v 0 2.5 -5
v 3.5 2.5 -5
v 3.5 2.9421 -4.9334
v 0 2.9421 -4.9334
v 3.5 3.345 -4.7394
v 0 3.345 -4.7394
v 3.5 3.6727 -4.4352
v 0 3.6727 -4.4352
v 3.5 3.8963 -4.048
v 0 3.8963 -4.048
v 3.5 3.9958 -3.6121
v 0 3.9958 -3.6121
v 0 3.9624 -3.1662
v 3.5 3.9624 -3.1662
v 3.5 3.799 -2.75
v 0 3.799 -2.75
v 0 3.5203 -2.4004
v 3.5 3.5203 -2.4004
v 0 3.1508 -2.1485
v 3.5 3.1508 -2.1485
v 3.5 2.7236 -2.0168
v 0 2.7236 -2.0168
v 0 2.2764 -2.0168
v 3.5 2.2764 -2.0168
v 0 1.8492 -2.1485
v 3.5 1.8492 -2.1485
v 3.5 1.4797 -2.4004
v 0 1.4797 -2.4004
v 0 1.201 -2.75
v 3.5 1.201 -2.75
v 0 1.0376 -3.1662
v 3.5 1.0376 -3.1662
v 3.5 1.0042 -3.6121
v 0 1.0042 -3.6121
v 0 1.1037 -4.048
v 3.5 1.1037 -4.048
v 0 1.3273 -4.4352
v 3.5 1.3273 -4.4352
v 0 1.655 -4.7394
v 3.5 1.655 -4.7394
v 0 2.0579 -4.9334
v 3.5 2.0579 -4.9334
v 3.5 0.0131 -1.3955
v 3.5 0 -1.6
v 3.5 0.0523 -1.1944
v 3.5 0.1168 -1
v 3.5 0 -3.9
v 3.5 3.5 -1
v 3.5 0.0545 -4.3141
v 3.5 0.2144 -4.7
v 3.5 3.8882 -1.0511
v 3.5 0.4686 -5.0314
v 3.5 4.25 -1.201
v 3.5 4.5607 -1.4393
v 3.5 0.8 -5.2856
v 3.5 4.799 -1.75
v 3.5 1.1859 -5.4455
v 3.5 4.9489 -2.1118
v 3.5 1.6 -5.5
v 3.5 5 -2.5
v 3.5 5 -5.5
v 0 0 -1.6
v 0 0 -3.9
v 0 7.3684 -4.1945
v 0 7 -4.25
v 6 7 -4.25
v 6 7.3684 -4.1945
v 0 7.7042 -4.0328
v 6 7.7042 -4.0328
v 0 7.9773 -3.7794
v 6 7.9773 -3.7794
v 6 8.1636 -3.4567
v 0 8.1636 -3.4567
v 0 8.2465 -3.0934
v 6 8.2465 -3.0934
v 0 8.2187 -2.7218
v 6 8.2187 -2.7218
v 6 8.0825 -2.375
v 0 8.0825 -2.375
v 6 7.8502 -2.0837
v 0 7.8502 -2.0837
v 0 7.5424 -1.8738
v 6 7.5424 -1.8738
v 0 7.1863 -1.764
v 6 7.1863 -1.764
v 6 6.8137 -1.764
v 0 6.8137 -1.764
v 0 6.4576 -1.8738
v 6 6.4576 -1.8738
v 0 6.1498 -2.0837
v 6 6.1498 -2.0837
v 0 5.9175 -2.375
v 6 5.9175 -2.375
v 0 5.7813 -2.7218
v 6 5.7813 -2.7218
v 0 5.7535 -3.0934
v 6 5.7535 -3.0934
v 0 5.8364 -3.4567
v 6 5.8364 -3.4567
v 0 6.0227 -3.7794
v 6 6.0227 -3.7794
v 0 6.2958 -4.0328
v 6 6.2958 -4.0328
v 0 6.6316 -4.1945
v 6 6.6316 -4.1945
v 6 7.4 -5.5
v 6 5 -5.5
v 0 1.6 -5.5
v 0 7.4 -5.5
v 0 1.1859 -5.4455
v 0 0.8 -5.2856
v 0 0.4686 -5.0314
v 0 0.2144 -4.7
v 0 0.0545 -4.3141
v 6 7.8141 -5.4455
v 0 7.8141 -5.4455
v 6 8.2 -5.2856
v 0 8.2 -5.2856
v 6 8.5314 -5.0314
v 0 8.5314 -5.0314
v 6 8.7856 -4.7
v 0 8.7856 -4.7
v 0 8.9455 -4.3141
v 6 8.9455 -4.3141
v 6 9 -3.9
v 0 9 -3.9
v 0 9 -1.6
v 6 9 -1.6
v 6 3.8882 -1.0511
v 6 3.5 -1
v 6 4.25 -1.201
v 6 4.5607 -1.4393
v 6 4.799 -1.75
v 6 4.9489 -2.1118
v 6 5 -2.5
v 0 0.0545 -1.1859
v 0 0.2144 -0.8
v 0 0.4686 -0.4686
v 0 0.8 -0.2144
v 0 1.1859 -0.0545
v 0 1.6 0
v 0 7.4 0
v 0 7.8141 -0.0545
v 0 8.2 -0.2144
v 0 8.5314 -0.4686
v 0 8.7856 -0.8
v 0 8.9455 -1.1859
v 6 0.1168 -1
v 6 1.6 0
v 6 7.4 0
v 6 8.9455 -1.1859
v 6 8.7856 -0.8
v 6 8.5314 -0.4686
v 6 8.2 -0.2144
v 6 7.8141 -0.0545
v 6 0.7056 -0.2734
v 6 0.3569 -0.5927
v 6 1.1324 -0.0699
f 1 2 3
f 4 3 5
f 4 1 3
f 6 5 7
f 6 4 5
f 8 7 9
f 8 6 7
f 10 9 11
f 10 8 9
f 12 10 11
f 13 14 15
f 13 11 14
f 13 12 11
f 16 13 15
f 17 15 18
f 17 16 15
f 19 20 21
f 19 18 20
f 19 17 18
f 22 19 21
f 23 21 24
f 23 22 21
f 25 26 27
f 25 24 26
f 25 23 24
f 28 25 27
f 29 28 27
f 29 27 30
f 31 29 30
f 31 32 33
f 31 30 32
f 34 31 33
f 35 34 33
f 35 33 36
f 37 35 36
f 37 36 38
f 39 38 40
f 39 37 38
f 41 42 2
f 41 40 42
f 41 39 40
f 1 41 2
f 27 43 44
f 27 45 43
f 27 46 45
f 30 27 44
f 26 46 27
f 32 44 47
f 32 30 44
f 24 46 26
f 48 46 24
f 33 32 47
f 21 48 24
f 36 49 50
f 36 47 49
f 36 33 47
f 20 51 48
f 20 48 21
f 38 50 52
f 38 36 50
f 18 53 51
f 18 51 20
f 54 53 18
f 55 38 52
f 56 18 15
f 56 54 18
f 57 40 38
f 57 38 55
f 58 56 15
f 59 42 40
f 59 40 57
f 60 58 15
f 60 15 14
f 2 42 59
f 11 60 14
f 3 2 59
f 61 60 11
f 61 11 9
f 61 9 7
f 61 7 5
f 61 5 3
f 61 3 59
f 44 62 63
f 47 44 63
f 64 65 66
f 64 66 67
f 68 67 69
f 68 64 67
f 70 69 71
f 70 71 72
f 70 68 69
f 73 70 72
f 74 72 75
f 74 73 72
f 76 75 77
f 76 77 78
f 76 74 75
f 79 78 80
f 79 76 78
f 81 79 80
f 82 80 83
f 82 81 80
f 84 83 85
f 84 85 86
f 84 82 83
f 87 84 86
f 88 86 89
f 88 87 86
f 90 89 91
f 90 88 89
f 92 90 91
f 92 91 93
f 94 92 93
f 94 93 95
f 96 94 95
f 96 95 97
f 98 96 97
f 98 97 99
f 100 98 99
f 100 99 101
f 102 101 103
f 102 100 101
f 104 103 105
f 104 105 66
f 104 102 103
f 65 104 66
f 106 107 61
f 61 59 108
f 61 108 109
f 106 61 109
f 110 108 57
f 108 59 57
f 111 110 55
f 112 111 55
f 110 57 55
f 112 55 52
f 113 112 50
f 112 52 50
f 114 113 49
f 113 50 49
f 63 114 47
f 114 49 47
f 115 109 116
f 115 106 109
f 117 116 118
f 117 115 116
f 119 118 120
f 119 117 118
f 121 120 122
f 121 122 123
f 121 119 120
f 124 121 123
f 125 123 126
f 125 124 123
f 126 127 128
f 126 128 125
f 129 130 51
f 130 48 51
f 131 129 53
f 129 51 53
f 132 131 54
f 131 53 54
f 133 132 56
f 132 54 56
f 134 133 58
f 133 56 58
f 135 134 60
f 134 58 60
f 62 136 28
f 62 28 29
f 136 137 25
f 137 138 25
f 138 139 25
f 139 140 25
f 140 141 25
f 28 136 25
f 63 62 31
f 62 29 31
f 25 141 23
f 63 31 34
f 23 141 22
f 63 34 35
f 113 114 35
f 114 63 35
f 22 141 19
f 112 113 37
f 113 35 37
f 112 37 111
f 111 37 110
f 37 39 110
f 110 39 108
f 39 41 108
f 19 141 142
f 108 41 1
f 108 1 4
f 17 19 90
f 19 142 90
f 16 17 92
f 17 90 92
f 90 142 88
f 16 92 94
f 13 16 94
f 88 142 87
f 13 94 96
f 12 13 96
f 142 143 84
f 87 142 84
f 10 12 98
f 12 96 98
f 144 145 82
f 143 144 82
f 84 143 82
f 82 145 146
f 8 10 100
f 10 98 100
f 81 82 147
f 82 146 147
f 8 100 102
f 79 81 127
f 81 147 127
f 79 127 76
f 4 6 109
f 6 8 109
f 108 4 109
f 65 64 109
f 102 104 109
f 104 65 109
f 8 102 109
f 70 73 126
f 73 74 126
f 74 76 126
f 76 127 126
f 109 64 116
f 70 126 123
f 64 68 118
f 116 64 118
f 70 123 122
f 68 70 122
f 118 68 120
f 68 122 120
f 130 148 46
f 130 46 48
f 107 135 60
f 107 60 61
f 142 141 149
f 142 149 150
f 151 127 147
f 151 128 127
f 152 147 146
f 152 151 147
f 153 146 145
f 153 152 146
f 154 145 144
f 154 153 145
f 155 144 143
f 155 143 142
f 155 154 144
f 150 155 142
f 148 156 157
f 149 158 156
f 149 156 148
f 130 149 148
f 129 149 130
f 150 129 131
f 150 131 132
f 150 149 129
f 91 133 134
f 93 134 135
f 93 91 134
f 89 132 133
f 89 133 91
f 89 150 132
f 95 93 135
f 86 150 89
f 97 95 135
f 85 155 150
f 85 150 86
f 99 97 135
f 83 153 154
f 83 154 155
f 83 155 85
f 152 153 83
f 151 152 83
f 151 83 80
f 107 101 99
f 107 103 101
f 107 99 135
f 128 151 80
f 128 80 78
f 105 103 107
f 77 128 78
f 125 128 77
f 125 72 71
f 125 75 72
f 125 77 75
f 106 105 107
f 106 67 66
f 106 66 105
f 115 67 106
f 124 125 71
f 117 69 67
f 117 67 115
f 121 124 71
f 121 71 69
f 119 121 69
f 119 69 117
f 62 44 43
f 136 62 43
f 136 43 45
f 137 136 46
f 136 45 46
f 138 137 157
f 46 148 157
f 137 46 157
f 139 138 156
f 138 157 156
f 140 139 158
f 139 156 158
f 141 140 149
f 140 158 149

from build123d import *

# Parameters (mm, degrees)
SKETCH1_W           = 5.5
SKETCH1_H           = 9
SKETCH1_R           = 1.5
SKETCH1_R_2         = 1.25
BOSS_EXTRUDE1_DEPTH = 6
SKETCH2_W           = 4.5
SKETCH2_H           = 5
CUT_EXTRUDE1_DEPTH  = 2.5
FILLET1_R           = 1.5
FILLET2_R           = 1.6


with BuildPart() as part:
    # Sketch1 → Boss-Extrude1 (new body)
    with BuildSketch(Plane(origin=(0, 0, 0), x_dir=(0, 0, -1), z_dir=(1, 0, 0))):
        with Locations((2.75, 4.5)):
            Rectangle(SKETCH1_W, SKETCH1_H)
        with Locations((3.5, 2.5)):
            Circle(SKETCH1_R, mode=Mode.SUBTRACT)
        with Locations((3, 7)):
            Circle(SKETCH1_R_2, mode=Mode.SUBTRACT)
    extrude(amount=BOSS_EXTRUDE1_DEPTH)

    # Sketch2 → Cut-Extrude1 (cut)
    with BuildSketch(Plane(origin=(6, 0, 0), x_dir=(0, 0, -1), z_dir=(1, 0, 0))):
        with Locations((3.25, 2.5)):
            Rectangle(SKETCH2_W, SKETCH2_H)
    extrude(amount=-CUT_EXTRUDE1_DEPTH, mode=Mode.SUBTRACT)

    # Fillet1
    fillet1_edges = [part.edges().sort_by_distance(p)[0] for p in [
        (4.75, 5, -1),
    ]]
    fillet(fillet1_edges, radius=FILLET1_R)

    # Fillet2
    fillet2_edges = [part.edges().sort_by_distance(p)[0] for p in [
        (3, 9, 0),
        (3, 0, 0),
        (1.75, 0, -5.5),
        (3, 9, -5.5),
    ]]
    fillet(fillet2_edges, radius=FILLET2_R)


solid = part.part
